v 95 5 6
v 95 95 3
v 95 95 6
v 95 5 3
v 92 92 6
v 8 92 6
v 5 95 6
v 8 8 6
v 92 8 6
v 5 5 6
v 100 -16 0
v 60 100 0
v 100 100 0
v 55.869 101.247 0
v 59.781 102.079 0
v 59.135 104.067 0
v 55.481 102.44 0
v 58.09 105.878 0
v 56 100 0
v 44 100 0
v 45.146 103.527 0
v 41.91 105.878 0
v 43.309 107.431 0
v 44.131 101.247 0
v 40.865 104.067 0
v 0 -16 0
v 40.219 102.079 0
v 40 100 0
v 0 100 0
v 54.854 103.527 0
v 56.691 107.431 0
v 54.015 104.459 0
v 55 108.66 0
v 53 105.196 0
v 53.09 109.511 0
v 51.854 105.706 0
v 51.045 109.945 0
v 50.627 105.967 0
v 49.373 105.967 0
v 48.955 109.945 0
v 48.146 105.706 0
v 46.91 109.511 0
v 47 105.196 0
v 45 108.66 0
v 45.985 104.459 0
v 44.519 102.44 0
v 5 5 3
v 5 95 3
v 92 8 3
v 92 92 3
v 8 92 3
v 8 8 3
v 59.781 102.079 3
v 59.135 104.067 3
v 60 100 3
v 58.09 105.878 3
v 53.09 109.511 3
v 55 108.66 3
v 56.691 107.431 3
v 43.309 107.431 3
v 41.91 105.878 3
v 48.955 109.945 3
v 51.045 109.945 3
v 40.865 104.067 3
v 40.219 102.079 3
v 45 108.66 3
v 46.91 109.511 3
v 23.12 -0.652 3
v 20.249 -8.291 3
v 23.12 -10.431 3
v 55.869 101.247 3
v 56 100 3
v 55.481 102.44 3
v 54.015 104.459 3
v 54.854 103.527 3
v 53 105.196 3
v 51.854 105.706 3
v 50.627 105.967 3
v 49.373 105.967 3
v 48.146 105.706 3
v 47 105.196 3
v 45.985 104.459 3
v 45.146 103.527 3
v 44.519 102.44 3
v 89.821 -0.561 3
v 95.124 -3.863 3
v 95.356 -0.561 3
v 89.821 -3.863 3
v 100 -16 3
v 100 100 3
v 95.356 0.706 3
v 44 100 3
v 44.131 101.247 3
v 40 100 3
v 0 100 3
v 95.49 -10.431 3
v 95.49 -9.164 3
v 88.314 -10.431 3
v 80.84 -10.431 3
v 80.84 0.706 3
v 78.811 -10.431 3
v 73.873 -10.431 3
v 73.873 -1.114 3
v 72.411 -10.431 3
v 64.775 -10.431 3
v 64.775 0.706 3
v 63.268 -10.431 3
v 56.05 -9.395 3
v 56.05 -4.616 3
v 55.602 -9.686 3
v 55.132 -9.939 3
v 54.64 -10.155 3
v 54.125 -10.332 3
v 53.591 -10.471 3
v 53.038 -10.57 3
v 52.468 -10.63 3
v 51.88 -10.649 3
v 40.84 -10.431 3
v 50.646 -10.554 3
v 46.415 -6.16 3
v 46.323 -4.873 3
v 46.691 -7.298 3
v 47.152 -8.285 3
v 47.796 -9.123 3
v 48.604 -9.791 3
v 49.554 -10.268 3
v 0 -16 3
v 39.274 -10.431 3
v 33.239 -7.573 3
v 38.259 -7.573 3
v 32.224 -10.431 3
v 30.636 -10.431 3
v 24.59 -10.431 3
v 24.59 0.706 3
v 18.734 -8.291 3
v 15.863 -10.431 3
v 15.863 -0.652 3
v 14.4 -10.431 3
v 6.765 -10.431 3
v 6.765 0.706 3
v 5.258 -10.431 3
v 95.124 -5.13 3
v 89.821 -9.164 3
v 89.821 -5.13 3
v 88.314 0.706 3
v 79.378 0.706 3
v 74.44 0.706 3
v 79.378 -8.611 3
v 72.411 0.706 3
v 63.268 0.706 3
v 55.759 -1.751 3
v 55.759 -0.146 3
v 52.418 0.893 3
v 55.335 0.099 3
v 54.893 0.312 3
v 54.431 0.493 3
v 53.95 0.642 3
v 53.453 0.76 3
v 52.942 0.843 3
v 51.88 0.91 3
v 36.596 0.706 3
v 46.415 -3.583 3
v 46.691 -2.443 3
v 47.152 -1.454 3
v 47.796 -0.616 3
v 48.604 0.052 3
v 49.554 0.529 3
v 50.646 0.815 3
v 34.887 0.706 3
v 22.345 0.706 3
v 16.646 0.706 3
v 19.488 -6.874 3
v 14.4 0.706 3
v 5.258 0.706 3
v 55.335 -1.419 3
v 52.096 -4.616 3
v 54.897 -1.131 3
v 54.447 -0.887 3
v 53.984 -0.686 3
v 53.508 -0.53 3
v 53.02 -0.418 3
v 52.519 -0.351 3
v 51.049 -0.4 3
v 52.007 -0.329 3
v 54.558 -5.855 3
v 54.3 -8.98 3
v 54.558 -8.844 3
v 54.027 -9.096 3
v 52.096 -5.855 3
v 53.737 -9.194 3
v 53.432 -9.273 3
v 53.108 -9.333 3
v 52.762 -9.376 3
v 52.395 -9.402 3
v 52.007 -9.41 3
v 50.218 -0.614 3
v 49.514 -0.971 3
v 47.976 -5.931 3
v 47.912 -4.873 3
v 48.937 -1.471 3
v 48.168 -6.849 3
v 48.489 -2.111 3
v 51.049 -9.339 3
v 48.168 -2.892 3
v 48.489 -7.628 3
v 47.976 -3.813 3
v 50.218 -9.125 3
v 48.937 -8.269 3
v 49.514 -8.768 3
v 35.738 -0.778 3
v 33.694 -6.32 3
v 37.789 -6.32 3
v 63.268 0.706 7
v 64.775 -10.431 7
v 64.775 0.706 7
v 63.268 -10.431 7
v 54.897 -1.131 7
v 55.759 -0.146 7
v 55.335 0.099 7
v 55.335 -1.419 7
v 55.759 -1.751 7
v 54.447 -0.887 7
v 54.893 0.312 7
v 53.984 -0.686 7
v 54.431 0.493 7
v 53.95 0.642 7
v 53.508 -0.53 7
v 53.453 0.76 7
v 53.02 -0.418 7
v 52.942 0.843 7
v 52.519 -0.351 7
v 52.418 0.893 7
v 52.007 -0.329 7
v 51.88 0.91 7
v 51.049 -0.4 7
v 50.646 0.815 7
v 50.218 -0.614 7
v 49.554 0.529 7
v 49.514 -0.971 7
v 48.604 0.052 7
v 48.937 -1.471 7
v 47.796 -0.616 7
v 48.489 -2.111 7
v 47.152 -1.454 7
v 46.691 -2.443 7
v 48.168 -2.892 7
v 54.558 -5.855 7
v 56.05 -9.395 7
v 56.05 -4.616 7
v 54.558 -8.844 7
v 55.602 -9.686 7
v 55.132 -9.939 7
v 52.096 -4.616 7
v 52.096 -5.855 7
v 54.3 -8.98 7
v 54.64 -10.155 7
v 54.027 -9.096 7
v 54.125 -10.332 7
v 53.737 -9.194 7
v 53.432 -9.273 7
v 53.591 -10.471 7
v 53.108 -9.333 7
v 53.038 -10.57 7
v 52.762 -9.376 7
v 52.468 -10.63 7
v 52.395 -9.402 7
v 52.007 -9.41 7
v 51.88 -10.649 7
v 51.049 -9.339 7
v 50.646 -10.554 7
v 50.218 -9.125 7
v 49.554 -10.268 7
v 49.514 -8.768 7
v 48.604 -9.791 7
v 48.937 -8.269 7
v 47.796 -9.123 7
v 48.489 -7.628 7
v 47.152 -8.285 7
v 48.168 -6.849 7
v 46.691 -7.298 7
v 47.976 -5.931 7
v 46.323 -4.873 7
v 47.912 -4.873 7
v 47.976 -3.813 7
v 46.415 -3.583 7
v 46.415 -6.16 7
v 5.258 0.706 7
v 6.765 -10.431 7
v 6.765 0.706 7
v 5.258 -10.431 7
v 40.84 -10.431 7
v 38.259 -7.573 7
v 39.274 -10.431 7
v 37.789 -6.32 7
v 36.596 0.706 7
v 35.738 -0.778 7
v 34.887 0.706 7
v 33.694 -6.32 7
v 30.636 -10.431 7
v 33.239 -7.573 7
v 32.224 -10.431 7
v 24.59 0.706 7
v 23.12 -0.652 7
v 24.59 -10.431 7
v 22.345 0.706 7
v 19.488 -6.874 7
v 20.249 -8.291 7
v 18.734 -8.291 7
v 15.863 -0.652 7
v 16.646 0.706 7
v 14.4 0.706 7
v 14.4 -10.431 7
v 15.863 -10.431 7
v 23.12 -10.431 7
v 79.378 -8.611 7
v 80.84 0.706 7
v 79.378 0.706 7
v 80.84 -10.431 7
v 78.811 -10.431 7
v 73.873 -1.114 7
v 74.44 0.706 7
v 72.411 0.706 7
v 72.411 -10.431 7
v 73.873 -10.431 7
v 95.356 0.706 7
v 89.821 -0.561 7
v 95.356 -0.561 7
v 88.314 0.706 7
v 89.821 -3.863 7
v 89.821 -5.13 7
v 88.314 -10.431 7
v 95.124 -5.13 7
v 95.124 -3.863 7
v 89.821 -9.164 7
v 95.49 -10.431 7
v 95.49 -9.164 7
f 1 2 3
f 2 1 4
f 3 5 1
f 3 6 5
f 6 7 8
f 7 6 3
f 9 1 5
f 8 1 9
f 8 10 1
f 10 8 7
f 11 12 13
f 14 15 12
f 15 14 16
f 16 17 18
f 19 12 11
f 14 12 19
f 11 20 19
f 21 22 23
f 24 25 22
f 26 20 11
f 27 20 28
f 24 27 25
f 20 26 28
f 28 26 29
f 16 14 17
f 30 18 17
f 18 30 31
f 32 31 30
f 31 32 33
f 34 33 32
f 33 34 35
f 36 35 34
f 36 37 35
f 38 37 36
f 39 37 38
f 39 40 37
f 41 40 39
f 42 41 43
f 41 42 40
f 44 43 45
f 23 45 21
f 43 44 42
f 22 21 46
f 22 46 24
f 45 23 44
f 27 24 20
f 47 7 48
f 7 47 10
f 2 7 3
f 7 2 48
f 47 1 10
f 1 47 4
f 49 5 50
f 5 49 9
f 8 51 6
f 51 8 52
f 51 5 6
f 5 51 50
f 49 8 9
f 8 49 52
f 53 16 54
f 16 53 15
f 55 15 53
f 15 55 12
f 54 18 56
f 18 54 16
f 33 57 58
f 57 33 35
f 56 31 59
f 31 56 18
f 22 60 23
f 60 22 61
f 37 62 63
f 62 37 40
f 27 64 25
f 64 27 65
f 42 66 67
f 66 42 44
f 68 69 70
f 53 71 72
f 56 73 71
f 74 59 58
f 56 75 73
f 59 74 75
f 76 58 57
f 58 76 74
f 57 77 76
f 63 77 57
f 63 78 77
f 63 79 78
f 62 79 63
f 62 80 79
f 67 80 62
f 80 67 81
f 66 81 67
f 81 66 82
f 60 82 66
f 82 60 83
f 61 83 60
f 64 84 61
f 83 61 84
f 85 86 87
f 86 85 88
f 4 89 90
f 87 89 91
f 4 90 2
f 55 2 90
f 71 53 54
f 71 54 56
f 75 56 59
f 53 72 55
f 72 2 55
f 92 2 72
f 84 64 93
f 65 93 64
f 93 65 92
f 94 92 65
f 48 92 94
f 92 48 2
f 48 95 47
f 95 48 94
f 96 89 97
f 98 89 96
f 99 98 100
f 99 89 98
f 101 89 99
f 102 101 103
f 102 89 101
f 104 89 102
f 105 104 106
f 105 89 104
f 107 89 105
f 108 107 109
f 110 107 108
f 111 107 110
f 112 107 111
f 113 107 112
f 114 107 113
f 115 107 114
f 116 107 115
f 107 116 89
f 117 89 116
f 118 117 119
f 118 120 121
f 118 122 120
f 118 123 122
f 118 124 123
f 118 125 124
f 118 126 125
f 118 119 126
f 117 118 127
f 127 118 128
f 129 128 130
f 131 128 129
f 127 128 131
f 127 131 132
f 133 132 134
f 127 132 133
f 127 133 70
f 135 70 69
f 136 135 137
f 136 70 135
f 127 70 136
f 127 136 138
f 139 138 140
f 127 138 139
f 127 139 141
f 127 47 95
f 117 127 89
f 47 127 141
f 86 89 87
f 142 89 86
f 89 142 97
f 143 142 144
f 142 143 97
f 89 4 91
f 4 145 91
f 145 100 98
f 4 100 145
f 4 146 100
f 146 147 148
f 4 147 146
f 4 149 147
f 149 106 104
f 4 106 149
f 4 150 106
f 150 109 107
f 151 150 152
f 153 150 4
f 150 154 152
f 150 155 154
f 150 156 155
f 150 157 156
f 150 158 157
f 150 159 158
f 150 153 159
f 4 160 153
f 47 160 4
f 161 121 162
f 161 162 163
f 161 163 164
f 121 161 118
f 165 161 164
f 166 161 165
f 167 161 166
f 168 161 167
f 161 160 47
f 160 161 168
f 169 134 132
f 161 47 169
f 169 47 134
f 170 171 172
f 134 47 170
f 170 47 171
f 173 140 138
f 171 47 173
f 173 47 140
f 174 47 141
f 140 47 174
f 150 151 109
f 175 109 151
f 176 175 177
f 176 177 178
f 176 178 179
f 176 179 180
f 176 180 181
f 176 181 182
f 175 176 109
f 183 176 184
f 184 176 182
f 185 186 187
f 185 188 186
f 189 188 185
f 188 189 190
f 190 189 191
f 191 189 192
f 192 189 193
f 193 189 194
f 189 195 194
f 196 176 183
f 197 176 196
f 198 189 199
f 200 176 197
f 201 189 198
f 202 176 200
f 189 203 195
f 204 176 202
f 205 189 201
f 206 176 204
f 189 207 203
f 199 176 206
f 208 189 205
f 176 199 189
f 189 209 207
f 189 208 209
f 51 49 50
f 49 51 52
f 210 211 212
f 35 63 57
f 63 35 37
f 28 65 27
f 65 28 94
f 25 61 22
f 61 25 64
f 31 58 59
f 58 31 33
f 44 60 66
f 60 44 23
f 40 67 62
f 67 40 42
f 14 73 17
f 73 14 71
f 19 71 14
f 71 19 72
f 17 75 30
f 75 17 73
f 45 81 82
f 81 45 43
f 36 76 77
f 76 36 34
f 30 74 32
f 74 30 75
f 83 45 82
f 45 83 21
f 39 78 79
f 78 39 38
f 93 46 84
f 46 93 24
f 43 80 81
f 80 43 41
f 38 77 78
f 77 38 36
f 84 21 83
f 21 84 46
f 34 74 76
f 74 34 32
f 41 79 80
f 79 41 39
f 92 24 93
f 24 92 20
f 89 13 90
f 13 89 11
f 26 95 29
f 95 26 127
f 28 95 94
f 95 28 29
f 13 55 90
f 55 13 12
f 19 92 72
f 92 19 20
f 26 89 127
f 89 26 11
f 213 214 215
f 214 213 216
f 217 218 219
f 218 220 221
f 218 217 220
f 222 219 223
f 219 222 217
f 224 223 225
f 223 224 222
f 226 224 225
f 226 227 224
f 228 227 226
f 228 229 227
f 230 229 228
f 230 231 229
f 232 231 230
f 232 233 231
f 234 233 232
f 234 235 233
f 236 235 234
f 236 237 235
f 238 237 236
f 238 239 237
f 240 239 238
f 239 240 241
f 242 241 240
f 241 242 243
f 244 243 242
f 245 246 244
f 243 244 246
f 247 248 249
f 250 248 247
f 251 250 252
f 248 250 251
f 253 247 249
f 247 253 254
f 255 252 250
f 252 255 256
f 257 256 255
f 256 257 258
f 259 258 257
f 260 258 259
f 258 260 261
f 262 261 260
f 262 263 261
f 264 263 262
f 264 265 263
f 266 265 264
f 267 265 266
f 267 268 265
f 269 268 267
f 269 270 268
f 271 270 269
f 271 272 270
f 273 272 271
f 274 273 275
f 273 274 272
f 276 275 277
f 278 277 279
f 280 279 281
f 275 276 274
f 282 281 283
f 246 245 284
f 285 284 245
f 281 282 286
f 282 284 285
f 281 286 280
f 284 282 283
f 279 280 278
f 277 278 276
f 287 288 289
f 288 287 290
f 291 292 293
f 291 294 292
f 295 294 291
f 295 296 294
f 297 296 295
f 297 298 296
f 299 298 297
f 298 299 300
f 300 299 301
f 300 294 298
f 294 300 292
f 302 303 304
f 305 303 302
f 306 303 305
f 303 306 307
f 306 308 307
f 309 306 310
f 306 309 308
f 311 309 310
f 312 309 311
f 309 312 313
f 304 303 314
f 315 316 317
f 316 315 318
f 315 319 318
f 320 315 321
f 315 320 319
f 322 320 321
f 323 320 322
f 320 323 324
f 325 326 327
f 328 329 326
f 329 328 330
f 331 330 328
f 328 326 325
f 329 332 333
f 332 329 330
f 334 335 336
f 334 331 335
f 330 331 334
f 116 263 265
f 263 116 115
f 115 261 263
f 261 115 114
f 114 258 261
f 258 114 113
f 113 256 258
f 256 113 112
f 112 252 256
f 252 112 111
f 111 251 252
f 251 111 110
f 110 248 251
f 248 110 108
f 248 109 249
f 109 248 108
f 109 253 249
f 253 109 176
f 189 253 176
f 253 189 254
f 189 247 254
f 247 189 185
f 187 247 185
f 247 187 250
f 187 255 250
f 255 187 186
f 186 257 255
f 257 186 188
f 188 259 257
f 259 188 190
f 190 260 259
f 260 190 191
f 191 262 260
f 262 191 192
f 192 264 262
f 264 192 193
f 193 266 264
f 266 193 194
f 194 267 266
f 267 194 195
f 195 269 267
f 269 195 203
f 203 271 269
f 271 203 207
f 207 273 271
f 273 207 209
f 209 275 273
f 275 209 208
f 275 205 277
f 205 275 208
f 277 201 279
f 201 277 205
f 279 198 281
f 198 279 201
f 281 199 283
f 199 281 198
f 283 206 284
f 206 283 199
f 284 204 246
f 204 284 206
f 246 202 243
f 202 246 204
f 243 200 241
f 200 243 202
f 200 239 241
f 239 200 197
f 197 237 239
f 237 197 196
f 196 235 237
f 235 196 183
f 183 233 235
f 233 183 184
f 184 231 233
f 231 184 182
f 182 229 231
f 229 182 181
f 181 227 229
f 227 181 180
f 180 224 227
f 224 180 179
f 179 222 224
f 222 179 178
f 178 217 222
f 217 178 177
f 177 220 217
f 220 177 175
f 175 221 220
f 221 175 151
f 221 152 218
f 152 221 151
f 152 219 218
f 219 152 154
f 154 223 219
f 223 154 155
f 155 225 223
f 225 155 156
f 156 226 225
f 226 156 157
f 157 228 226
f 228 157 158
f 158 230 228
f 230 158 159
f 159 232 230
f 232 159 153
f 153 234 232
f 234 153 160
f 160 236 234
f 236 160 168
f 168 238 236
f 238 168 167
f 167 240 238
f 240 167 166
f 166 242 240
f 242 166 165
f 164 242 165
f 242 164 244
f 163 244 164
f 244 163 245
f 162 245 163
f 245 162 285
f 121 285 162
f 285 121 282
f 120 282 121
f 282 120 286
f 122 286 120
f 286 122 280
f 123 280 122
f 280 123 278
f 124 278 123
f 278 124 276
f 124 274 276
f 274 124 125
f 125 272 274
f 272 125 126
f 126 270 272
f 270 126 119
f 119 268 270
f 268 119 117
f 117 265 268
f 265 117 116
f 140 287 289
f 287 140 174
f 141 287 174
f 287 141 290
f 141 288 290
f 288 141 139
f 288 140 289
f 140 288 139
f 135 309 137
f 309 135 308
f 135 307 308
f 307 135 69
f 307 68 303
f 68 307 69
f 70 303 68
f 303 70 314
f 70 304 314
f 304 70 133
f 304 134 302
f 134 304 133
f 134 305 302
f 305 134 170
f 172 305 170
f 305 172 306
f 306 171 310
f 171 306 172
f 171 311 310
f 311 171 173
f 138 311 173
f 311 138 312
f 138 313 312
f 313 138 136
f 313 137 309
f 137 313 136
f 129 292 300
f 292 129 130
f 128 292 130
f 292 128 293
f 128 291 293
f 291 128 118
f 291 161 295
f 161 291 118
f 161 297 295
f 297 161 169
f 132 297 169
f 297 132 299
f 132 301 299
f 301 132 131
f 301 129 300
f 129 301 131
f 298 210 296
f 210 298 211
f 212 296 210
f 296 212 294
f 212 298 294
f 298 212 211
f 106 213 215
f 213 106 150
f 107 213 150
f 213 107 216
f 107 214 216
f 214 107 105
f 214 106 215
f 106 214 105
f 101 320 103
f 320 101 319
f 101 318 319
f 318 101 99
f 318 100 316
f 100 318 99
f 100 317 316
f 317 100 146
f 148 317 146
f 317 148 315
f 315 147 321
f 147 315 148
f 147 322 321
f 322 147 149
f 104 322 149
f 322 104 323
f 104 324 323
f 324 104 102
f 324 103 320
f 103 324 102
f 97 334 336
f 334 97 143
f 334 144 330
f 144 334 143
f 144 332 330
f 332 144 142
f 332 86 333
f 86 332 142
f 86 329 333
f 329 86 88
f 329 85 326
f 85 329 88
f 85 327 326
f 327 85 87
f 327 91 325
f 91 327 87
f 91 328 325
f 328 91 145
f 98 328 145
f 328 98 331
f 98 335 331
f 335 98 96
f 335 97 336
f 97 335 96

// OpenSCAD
$fn=30;

size = 100;
height = 3;
edge = 5;
text_shift = 16;

union() {
    translate([0, -text_shift, 0]) {
        cube([size, size + text_shift, height]);
    }
    translate([edge, edge, 0]) {
        difference() {
            cube([size - edge * 2, size - edge * 2, height * 2]);
            translate([height, height, 0]) {
                cube([size - edge * 2 - 6 , size - edge * 2 - 6, height * 2]);
            }
        }
    }
    //handle
    translate([size/2, size, 0]) {
        difference() {
            cylinder(r = 10, h = height);
            cylinder(r = 6, h = height);
        }
    }
}

translate([50, -5, 0]) {
    linear_extrude(height = 7) {
        //using spaces for spacing as spacing = 2 messes it up
        text(text = "I M A G I N E", font = "Flama Basic", halign = "center", valign = "center", spacing = 1, size = 11);
    }
}
